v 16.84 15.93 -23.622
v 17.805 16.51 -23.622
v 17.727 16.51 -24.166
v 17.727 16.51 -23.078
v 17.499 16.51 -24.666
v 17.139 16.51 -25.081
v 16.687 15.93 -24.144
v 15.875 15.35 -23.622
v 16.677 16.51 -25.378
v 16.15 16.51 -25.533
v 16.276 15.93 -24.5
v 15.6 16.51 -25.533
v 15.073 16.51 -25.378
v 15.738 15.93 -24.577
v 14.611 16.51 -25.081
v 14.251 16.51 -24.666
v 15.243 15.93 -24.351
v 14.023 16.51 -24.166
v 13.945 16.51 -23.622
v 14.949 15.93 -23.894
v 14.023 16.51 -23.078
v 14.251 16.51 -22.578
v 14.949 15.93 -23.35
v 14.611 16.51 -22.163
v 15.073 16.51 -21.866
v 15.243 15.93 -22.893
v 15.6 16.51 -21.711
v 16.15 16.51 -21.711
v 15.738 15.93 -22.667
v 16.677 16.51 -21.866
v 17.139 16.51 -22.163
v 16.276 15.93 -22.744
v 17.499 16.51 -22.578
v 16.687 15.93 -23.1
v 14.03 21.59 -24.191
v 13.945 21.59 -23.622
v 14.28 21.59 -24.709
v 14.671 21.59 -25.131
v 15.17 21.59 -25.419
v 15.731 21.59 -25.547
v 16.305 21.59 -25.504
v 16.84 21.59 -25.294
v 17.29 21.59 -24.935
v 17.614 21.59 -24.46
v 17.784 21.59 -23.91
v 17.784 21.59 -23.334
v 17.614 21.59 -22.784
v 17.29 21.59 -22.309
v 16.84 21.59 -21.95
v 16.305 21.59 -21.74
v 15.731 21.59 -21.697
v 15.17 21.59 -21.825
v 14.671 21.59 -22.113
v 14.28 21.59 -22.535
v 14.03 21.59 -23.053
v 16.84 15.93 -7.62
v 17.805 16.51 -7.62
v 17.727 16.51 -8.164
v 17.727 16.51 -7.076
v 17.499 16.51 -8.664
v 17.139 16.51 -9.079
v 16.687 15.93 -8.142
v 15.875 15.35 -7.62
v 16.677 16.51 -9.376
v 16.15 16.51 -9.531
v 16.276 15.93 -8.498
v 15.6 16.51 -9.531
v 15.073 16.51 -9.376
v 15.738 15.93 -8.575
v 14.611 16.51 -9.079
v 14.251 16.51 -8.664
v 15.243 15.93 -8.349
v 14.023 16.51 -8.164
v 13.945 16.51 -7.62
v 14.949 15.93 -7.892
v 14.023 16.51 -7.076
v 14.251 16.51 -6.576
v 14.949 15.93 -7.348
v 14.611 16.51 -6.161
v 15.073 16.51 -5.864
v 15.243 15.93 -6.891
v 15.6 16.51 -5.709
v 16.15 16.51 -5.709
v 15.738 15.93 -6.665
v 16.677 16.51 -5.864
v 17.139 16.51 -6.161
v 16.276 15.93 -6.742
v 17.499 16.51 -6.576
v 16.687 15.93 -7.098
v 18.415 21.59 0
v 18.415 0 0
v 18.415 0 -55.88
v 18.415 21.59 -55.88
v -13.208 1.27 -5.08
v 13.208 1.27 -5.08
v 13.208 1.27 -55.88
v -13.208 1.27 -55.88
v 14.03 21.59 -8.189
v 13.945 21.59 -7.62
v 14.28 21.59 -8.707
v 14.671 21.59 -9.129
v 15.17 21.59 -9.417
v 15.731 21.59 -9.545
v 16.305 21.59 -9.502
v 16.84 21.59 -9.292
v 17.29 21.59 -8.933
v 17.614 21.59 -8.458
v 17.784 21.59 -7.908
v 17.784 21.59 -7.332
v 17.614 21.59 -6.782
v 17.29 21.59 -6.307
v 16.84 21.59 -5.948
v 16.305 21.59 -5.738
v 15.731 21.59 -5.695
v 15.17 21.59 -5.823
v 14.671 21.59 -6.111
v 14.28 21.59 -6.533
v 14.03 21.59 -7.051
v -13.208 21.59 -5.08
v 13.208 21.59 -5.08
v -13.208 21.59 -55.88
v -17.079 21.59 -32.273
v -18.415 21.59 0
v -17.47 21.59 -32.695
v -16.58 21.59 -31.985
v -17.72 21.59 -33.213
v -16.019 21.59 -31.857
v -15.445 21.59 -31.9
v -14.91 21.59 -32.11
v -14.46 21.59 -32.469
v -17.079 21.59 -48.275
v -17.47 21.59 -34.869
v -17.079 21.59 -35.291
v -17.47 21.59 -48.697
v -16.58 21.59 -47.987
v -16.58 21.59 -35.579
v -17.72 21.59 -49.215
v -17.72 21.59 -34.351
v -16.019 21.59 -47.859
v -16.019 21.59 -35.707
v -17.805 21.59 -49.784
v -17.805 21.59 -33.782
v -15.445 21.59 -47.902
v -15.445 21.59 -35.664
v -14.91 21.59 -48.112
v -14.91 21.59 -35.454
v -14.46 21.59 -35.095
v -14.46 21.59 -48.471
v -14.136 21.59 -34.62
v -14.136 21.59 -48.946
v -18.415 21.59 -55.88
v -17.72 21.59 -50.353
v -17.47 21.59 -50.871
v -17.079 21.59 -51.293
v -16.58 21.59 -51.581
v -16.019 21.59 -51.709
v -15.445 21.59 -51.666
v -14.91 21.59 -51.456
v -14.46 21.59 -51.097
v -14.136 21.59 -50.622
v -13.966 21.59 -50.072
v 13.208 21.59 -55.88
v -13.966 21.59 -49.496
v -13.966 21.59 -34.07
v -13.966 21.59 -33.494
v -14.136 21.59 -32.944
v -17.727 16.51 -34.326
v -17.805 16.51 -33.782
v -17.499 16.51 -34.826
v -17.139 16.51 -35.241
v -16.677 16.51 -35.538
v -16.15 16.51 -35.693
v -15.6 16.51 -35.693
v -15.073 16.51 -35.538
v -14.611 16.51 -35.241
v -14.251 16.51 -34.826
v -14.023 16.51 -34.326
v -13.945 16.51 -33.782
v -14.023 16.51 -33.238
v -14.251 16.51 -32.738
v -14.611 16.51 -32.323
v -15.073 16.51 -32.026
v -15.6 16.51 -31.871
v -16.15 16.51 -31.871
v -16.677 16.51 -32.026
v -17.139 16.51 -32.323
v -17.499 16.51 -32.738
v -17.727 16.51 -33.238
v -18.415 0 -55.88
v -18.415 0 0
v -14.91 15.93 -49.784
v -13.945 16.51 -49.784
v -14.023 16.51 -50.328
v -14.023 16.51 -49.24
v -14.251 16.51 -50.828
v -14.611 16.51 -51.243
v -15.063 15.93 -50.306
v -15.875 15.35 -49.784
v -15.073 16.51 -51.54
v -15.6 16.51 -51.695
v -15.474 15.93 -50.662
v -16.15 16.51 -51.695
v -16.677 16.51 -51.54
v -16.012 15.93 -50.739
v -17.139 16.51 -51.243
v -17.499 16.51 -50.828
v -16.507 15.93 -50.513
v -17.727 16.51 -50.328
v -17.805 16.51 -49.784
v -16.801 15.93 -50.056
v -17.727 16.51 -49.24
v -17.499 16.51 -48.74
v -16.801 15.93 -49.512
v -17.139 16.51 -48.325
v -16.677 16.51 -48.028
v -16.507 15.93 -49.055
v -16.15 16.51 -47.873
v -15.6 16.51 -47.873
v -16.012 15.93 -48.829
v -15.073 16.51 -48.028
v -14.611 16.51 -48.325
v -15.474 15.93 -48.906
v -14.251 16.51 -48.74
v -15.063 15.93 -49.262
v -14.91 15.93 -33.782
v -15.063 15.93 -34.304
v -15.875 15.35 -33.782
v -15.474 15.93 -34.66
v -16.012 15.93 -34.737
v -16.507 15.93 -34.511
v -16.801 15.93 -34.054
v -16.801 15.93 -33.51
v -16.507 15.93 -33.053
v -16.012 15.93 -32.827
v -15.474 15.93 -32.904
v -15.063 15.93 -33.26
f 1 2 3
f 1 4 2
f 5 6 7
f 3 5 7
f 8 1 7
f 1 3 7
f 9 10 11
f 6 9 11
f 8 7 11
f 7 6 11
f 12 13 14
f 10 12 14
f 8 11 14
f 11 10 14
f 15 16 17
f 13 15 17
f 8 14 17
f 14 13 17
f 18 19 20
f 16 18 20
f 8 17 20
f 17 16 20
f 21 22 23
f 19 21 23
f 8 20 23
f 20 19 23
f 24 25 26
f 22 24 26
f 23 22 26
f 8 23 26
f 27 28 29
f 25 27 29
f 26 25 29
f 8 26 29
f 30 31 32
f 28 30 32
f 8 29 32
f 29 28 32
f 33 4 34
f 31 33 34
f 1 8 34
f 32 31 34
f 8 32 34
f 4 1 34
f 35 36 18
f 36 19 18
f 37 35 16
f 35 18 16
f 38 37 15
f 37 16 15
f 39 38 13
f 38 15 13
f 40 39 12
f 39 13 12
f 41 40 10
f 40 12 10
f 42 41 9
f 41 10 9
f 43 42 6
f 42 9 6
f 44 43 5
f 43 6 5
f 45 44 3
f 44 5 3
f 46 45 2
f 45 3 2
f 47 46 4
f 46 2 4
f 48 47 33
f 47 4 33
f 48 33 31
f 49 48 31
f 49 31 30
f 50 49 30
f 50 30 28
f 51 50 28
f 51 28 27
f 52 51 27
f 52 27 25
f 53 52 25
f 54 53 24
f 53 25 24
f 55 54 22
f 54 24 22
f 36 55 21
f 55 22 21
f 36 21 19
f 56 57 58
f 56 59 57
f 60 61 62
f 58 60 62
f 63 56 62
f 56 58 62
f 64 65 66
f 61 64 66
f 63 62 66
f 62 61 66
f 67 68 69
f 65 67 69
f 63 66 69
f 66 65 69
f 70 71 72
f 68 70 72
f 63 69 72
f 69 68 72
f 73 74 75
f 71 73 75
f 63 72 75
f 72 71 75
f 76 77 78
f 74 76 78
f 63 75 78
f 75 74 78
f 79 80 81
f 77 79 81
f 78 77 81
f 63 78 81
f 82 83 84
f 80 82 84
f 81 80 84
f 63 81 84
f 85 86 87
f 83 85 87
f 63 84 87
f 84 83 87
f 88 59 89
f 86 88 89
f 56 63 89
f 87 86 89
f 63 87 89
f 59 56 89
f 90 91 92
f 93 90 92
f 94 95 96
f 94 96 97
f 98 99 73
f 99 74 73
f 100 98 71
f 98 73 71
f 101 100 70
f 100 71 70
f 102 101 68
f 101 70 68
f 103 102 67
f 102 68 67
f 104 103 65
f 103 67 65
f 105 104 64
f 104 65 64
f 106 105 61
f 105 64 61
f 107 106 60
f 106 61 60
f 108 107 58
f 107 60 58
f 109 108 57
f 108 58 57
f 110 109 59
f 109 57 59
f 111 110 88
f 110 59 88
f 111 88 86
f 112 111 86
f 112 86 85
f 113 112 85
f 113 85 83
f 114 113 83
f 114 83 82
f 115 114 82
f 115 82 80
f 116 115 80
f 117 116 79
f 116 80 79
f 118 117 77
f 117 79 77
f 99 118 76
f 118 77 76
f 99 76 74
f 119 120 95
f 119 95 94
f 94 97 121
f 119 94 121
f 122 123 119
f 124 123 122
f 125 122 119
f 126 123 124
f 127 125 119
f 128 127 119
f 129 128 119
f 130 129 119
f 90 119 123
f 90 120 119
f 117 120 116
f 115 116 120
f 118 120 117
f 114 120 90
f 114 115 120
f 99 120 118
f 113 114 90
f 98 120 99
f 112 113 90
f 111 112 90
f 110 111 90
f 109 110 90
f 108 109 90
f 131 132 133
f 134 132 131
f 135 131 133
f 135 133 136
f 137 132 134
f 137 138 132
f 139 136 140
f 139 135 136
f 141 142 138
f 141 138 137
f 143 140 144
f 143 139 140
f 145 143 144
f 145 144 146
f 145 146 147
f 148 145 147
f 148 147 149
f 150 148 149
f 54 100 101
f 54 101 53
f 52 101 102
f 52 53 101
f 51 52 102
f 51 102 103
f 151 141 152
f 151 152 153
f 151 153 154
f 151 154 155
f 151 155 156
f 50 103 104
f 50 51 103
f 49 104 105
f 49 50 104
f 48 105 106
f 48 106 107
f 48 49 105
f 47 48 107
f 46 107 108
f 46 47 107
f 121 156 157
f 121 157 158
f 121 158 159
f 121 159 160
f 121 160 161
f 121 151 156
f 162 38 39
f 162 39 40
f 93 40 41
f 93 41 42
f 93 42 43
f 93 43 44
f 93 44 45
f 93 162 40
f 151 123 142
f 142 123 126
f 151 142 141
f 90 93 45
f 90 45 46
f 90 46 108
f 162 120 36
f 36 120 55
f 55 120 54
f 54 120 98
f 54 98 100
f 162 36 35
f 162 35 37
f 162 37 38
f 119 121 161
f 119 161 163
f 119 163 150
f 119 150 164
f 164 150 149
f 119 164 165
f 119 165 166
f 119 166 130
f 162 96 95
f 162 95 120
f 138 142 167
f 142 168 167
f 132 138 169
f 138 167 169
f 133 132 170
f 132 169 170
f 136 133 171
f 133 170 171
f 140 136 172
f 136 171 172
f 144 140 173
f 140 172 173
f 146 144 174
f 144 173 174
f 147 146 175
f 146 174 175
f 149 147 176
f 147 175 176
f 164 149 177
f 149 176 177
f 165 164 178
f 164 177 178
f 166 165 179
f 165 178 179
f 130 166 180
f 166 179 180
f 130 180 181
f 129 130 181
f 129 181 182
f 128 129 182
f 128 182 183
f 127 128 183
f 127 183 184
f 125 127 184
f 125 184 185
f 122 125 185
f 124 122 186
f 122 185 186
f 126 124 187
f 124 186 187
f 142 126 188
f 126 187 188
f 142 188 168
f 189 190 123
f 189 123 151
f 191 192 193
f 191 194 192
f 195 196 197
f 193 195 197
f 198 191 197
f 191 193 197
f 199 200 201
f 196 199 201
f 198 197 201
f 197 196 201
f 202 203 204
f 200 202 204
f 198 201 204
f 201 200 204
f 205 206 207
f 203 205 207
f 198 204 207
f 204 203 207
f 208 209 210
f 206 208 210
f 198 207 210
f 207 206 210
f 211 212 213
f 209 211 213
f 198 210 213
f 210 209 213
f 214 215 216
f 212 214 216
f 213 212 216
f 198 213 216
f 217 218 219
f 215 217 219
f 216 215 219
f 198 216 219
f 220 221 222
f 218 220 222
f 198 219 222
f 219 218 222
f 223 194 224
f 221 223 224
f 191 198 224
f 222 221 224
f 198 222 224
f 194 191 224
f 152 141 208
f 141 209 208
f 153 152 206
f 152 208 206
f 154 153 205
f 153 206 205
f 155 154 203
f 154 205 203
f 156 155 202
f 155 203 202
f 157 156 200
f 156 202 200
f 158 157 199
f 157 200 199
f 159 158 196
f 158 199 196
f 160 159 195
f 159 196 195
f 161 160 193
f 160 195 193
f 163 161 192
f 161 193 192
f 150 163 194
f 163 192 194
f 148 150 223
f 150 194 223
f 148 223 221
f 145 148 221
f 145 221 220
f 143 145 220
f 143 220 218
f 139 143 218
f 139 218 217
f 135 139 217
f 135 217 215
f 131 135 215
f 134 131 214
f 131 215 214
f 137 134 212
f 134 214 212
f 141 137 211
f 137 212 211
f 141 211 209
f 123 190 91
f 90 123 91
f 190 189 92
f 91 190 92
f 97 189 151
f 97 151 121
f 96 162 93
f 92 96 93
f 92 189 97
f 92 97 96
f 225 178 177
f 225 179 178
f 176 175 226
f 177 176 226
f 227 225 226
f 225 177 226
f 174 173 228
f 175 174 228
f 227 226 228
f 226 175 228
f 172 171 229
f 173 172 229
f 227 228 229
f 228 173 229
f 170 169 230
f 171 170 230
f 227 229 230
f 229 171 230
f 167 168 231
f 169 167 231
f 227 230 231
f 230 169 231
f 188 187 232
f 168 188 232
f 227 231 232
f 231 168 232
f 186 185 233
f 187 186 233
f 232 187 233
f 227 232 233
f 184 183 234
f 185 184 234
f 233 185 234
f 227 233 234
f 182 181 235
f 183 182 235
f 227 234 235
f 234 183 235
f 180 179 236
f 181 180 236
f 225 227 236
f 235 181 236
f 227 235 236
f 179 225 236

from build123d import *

# Parameters (mm, degrees)
SKETCH1_W                   = 36.83
SKETCH1_H                   = 55.88
BOSS_EXTRUDE1_DEPTH         = 21.59
SKETCH3_W                   = 26.416
SKETCH3_H                   = 20.32
CUT_EXTRUDE1_DEPTH          = 50.8
F_1_0_MM_DOWEL_HOLES1_D     = 3.8608
F_1_0_MM_DOWEL_HOLES1_DEPTH = 5.08
F_1_0_MM_DOWEL_HOLES1_TIP   = 1.159901339


with BuildPart() as part:
    # Sketch1 → Boss-Extrude1 (new body)
    with BuildSketch(Plane(origin=(0, 0, 0), x_dir=(1, 0, 0), z_dir=(0, 1, 0))):
        with Locations((0, 27.94)):
            Rectangle(SKETCH1_W, SKETCH1_H)
    extrude(amount=BOSS_EXTRUDE1_DEPTH)

    # Sketch3 → Cut-Extrude1 (cut)
    with BuildSketch(Plane(origin=(0, 0, -55.88), x_dir=(-1, 0, 0), z_dir=(0, 0, -1))):
        with Locations((0, 11.43)):
            Rectangle(SKETCH3_W, SKETCH3_H)
    extrude(amount=-CUT_EXTRUDE1_DEPTH, mode=Mode.SUBTRACT)

    # Ø1.0 mm Dowel Holes1
    with Locations(Plane(origin=(0, 21.59, 0), x_dir=(1, 0, 0), z_dir=(0, 1, 0))):
        with Locations((15.875, 7.62), (15.875, 23.622), (-15.875, 33.782), (-15.875, 49.784)):
            Hole(F_1_0_MM_DOWEL_HOLES1_D / 2, depth=F_1_0_MM_DOWEL_HOLES1_DEPTH)
            with Locations((0, 0, -(F_1_0_MM_DOWEL_HOLES1_DEPTH + F_1_0_MM_DOWEL_HOLES1_TIP / 2))):  # 118° drill point
                Cone(0, F_1_0_MM_DOWEL_HOLES1_D / 2, F_1_0_MM_DOWEL_HOLES1_TIP, mode=Mode.SUBTRACT)


solid = part.part
